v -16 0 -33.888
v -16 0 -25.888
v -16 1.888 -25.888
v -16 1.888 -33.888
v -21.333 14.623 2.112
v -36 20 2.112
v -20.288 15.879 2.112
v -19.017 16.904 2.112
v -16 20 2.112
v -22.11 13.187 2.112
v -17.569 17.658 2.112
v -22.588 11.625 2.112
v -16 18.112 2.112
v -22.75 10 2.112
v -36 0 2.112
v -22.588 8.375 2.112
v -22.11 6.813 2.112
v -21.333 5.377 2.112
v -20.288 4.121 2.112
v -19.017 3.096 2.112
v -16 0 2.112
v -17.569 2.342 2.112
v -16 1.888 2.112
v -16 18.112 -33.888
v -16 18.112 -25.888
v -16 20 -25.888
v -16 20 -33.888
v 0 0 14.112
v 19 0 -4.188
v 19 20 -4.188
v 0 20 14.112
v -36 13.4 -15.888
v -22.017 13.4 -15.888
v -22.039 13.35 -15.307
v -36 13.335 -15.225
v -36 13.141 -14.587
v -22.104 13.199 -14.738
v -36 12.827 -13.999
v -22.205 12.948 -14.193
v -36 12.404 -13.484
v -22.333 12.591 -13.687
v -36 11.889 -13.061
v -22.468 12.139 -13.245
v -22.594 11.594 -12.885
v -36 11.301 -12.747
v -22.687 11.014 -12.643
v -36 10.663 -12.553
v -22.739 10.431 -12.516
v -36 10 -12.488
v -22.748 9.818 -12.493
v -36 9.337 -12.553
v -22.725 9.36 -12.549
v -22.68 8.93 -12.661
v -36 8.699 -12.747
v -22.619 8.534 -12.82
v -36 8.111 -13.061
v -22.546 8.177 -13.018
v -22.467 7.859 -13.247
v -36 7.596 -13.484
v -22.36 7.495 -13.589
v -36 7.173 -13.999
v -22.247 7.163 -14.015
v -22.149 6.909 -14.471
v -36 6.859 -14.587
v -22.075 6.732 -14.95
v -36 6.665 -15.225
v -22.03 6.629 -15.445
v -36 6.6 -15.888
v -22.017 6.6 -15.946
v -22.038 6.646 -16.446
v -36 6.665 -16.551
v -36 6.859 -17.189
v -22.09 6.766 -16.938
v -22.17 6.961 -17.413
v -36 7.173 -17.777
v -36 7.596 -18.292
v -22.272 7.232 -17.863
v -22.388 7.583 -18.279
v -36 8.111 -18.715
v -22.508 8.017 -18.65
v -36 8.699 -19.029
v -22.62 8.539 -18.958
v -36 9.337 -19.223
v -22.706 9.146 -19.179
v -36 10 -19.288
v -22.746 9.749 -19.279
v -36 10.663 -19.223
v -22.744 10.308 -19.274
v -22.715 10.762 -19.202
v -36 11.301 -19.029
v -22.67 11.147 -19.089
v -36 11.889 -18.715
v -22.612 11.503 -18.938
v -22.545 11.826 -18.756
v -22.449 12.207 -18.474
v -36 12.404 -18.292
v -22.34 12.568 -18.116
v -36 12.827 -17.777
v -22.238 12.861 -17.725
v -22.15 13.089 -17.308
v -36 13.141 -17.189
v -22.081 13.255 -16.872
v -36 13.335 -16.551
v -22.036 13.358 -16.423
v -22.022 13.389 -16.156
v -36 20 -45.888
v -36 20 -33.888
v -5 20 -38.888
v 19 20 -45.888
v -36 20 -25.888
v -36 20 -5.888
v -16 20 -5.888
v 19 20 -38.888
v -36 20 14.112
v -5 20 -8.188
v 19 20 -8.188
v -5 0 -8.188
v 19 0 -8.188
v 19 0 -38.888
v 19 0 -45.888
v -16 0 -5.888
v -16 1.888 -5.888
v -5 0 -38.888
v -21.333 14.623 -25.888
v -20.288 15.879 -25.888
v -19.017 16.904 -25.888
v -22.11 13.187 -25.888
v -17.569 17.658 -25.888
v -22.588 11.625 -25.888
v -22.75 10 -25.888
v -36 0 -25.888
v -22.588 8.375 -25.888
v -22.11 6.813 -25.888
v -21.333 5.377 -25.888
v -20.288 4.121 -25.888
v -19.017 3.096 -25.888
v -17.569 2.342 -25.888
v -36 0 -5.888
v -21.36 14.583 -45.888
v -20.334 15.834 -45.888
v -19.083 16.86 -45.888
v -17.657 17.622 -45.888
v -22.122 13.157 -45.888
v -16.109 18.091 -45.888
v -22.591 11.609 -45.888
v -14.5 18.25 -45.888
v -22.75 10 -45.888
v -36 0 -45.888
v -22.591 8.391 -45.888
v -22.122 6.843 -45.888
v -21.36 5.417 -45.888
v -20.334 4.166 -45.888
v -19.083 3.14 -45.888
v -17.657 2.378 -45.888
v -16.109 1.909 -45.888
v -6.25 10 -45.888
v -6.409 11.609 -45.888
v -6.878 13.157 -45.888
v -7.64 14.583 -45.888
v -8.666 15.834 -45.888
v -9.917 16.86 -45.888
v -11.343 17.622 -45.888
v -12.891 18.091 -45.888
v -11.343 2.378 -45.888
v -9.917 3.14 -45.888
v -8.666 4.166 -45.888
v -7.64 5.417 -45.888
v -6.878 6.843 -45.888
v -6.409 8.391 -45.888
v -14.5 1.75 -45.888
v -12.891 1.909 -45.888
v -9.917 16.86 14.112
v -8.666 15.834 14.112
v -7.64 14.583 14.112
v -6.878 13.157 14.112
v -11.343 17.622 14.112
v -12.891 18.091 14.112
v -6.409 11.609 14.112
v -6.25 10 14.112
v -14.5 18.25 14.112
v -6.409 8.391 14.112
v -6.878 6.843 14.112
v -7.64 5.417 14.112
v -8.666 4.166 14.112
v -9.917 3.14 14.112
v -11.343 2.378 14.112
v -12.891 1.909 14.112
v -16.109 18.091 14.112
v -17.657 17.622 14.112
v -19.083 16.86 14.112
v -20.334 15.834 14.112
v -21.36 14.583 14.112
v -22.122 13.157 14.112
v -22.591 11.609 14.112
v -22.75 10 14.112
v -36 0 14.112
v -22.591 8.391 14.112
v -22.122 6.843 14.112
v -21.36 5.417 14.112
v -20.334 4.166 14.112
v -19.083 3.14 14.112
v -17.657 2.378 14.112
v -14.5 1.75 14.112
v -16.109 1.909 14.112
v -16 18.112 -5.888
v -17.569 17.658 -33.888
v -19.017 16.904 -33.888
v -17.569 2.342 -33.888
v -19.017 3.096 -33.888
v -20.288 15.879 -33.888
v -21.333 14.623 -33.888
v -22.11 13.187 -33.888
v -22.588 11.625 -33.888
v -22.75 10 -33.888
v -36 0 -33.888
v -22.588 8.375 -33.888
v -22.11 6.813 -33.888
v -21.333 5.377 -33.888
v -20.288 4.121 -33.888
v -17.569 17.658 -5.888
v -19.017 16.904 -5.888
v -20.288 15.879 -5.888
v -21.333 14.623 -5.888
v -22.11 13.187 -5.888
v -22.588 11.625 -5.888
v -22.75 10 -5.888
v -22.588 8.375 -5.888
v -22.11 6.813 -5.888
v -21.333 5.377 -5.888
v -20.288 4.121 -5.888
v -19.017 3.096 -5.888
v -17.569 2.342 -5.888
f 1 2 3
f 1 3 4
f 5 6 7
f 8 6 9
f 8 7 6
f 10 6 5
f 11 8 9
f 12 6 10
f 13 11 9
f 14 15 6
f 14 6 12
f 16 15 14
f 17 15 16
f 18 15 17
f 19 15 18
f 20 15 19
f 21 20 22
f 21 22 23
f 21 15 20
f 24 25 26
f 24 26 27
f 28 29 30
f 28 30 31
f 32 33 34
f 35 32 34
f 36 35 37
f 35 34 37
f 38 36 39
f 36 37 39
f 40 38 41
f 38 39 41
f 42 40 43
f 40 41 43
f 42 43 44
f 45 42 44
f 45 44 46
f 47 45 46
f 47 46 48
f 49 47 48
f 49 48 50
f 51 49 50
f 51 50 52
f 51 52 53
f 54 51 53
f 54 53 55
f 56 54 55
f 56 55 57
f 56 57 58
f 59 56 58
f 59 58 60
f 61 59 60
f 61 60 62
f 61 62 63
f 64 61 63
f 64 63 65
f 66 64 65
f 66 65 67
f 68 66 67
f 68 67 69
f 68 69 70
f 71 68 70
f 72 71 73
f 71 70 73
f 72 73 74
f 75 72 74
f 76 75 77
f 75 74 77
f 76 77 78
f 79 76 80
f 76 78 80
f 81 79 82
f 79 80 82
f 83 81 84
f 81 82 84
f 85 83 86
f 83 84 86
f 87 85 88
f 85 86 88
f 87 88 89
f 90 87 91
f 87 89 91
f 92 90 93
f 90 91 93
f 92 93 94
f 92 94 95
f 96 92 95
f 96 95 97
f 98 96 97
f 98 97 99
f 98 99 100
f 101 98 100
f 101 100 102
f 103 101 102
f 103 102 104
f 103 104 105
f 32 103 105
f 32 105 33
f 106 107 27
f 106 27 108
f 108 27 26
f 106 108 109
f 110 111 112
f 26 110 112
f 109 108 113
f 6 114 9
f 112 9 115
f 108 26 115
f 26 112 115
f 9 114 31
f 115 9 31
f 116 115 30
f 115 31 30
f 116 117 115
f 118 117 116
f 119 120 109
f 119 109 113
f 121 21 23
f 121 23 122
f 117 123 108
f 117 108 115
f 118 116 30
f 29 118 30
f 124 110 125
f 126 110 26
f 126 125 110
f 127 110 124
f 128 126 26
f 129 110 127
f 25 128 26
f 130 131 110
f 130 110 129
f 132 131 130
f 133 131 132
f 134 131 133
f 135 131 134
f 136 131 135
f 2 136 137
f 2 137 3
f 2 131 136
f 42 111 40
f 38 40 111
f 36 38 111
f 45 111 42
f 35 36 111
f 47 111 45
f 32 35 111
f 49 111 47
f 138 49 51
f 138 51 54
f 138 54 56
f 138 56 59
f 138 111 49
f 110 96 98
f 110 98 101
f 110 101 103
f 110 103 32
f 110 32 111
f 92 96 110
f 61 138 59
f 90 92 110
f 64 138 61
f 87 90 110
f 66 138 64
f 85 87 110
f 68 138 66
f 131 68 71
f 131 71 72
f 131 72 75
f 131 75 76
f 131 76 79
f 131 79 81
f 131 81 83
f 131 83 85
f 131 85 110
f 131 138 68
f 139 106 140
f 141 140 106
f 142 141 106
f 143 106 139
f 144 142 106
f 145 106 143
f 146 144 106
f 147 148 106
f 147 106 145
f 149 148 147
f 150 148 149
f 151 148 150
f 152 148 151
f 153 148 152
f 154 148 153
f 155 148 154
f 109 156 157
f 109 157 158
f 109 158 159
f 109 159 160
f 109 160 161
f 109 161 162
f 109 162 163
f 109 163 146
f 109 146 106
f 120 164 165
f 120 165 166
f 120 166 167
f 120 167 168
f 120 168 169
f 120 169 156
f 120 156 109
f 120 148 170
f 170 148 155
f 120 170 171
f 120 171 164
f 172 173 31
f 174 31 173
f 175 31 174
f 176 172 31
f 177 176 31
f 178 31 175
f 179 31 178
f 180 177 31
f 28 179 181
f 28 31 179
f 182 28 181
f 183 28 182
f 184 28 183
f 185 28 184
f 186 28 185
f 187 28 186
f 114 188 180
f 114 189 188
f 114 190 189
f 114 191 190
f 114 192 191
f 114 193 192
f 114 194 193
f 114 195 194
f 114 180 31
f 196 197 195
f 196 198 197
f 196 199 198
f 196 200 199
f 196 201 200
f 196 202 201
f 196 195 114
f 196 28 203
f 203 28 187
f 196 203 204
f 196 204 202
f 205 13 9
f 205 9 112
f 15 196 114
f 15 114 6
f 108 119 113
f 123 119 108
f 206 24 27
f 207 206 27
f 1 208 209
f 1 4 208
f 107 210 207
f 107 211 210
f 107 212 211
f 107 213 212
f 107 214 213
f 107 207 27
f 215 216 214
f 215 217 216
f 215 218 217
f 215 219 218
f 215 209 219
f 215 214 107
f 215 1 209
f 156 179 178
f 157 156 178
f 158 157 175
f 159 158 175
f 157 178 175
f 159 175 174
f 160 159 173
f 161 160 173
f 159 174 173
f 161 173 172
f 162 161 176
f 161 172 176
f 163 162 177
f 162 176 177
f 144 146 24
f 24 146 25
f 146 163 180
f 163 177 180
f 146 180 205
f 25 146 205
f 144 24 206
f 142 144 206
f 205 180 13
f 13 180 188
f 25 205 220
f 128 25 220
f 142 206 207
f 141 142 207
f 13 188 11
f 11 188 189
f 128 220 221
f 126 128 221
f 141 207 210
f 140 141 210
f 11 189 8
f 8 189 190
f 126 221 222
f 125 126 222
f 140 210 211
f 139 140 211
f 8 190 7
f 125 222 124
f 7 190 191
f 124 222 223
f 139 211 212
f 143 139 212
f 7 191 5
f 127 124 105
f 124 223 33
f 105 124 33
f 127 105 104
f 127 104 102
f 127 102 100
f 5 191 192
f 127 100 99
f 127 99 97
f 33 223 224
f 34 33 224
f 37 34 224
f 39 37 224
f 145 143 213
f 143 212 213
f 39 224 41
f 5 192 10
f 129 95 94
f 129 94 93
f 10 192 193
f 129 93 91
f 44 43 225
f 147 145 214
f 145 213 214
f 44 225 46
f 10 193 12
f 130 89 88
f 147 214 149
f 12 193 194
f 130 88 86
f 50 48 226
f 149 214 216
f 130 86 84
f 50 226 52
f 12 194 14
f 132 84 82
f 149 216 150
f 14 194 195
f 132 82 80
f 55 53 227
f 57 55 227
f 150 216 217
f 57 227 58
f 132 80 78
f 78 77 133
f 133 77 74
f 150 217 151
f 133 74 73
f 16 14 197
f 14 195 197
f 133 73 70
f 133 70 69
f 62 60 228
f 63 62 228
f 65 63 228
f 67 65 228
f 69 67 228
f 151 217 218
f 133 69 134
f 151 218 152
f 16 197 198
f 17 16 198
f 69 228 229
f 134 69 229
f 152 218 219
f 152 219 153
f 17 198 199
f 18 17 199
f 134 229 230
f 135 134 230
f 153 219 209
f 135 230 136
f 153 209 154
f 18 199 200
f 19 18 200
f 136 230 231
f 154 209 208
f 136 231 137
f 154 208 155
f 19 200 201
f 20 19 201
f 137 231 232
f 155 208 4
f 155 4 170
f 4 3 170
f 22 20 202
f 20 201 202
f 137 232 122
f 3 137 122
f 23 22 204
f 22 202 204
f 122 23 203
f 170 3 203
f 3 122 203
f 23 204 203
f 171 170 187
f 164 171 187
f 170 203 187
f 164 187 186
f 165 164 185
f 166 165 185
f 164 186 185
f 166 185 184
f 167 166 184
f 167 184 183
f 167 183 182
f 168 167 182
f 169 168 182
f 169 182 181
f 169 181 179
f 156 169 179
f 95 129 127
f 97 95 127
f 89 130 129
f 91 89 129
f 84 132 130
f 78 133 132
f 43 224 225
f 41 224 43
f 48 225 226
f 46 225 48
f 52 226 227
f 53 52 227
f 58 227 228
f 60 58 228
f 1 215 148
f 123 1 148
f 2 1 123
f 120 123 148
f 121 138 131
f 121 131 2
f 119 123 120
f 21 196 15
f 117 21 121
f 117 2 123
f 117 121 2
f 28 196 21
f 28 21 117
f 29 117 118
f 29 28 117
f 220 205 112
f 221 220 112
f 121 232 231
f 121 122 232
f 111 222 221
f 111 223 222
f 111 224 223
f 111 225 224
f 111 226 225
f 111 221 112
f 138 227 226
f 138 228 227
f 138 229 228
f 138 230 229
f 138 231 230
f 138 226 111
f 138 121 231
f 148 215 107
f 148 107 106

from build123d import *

# Parameters (mm, degrees)
F1_DEPTH = 20
F2_R     = 8.25
F3_DEPTH = 60.001
F5_D     = 6.8
F5_DEPTH = 20


with BuildPart() as f1:
    # F0 (on Front) → F1 (new body)
    with BuildSketch(Plane.XZ):
        Polygon((-36, -33.888159), (-36, -45.888159), (19, -45.888159), (19, -38.888159), (-5, -38.888159), (-5, -8.188159), (19, -8.188159), (19, -4.188159), (0, 14.111841), (-36, 14.111841), (-36, 2.111841), (-16, 2.111841), (-16, -5.888159), (-36, -5.888159), (-36, -25.888159), (-16, -25.888159), (-16, -33.888159), align=None)
    extrude(amount=-F1_DEPTH)

    # F2 (on face) → F3 (cut, through all)
    with BuildSketch(Plane.XY.offset(14.111841)):
        with Locations((-14.5, 10)):
            Circle(F2_R)
    extrude(amount=-F3_DEPTH, mode=Mode.SUBTRACT)

    # F5
    with Locations(Plane(origin=(-36, 0, 0), x_dir=(0, -1, 0), z_dir=(-1, 0, 0))):
        with Locations((-10, -15.888159)):
            Hole(F5_D / 2, depth=F5_DEPTH)


solid = f1.part
